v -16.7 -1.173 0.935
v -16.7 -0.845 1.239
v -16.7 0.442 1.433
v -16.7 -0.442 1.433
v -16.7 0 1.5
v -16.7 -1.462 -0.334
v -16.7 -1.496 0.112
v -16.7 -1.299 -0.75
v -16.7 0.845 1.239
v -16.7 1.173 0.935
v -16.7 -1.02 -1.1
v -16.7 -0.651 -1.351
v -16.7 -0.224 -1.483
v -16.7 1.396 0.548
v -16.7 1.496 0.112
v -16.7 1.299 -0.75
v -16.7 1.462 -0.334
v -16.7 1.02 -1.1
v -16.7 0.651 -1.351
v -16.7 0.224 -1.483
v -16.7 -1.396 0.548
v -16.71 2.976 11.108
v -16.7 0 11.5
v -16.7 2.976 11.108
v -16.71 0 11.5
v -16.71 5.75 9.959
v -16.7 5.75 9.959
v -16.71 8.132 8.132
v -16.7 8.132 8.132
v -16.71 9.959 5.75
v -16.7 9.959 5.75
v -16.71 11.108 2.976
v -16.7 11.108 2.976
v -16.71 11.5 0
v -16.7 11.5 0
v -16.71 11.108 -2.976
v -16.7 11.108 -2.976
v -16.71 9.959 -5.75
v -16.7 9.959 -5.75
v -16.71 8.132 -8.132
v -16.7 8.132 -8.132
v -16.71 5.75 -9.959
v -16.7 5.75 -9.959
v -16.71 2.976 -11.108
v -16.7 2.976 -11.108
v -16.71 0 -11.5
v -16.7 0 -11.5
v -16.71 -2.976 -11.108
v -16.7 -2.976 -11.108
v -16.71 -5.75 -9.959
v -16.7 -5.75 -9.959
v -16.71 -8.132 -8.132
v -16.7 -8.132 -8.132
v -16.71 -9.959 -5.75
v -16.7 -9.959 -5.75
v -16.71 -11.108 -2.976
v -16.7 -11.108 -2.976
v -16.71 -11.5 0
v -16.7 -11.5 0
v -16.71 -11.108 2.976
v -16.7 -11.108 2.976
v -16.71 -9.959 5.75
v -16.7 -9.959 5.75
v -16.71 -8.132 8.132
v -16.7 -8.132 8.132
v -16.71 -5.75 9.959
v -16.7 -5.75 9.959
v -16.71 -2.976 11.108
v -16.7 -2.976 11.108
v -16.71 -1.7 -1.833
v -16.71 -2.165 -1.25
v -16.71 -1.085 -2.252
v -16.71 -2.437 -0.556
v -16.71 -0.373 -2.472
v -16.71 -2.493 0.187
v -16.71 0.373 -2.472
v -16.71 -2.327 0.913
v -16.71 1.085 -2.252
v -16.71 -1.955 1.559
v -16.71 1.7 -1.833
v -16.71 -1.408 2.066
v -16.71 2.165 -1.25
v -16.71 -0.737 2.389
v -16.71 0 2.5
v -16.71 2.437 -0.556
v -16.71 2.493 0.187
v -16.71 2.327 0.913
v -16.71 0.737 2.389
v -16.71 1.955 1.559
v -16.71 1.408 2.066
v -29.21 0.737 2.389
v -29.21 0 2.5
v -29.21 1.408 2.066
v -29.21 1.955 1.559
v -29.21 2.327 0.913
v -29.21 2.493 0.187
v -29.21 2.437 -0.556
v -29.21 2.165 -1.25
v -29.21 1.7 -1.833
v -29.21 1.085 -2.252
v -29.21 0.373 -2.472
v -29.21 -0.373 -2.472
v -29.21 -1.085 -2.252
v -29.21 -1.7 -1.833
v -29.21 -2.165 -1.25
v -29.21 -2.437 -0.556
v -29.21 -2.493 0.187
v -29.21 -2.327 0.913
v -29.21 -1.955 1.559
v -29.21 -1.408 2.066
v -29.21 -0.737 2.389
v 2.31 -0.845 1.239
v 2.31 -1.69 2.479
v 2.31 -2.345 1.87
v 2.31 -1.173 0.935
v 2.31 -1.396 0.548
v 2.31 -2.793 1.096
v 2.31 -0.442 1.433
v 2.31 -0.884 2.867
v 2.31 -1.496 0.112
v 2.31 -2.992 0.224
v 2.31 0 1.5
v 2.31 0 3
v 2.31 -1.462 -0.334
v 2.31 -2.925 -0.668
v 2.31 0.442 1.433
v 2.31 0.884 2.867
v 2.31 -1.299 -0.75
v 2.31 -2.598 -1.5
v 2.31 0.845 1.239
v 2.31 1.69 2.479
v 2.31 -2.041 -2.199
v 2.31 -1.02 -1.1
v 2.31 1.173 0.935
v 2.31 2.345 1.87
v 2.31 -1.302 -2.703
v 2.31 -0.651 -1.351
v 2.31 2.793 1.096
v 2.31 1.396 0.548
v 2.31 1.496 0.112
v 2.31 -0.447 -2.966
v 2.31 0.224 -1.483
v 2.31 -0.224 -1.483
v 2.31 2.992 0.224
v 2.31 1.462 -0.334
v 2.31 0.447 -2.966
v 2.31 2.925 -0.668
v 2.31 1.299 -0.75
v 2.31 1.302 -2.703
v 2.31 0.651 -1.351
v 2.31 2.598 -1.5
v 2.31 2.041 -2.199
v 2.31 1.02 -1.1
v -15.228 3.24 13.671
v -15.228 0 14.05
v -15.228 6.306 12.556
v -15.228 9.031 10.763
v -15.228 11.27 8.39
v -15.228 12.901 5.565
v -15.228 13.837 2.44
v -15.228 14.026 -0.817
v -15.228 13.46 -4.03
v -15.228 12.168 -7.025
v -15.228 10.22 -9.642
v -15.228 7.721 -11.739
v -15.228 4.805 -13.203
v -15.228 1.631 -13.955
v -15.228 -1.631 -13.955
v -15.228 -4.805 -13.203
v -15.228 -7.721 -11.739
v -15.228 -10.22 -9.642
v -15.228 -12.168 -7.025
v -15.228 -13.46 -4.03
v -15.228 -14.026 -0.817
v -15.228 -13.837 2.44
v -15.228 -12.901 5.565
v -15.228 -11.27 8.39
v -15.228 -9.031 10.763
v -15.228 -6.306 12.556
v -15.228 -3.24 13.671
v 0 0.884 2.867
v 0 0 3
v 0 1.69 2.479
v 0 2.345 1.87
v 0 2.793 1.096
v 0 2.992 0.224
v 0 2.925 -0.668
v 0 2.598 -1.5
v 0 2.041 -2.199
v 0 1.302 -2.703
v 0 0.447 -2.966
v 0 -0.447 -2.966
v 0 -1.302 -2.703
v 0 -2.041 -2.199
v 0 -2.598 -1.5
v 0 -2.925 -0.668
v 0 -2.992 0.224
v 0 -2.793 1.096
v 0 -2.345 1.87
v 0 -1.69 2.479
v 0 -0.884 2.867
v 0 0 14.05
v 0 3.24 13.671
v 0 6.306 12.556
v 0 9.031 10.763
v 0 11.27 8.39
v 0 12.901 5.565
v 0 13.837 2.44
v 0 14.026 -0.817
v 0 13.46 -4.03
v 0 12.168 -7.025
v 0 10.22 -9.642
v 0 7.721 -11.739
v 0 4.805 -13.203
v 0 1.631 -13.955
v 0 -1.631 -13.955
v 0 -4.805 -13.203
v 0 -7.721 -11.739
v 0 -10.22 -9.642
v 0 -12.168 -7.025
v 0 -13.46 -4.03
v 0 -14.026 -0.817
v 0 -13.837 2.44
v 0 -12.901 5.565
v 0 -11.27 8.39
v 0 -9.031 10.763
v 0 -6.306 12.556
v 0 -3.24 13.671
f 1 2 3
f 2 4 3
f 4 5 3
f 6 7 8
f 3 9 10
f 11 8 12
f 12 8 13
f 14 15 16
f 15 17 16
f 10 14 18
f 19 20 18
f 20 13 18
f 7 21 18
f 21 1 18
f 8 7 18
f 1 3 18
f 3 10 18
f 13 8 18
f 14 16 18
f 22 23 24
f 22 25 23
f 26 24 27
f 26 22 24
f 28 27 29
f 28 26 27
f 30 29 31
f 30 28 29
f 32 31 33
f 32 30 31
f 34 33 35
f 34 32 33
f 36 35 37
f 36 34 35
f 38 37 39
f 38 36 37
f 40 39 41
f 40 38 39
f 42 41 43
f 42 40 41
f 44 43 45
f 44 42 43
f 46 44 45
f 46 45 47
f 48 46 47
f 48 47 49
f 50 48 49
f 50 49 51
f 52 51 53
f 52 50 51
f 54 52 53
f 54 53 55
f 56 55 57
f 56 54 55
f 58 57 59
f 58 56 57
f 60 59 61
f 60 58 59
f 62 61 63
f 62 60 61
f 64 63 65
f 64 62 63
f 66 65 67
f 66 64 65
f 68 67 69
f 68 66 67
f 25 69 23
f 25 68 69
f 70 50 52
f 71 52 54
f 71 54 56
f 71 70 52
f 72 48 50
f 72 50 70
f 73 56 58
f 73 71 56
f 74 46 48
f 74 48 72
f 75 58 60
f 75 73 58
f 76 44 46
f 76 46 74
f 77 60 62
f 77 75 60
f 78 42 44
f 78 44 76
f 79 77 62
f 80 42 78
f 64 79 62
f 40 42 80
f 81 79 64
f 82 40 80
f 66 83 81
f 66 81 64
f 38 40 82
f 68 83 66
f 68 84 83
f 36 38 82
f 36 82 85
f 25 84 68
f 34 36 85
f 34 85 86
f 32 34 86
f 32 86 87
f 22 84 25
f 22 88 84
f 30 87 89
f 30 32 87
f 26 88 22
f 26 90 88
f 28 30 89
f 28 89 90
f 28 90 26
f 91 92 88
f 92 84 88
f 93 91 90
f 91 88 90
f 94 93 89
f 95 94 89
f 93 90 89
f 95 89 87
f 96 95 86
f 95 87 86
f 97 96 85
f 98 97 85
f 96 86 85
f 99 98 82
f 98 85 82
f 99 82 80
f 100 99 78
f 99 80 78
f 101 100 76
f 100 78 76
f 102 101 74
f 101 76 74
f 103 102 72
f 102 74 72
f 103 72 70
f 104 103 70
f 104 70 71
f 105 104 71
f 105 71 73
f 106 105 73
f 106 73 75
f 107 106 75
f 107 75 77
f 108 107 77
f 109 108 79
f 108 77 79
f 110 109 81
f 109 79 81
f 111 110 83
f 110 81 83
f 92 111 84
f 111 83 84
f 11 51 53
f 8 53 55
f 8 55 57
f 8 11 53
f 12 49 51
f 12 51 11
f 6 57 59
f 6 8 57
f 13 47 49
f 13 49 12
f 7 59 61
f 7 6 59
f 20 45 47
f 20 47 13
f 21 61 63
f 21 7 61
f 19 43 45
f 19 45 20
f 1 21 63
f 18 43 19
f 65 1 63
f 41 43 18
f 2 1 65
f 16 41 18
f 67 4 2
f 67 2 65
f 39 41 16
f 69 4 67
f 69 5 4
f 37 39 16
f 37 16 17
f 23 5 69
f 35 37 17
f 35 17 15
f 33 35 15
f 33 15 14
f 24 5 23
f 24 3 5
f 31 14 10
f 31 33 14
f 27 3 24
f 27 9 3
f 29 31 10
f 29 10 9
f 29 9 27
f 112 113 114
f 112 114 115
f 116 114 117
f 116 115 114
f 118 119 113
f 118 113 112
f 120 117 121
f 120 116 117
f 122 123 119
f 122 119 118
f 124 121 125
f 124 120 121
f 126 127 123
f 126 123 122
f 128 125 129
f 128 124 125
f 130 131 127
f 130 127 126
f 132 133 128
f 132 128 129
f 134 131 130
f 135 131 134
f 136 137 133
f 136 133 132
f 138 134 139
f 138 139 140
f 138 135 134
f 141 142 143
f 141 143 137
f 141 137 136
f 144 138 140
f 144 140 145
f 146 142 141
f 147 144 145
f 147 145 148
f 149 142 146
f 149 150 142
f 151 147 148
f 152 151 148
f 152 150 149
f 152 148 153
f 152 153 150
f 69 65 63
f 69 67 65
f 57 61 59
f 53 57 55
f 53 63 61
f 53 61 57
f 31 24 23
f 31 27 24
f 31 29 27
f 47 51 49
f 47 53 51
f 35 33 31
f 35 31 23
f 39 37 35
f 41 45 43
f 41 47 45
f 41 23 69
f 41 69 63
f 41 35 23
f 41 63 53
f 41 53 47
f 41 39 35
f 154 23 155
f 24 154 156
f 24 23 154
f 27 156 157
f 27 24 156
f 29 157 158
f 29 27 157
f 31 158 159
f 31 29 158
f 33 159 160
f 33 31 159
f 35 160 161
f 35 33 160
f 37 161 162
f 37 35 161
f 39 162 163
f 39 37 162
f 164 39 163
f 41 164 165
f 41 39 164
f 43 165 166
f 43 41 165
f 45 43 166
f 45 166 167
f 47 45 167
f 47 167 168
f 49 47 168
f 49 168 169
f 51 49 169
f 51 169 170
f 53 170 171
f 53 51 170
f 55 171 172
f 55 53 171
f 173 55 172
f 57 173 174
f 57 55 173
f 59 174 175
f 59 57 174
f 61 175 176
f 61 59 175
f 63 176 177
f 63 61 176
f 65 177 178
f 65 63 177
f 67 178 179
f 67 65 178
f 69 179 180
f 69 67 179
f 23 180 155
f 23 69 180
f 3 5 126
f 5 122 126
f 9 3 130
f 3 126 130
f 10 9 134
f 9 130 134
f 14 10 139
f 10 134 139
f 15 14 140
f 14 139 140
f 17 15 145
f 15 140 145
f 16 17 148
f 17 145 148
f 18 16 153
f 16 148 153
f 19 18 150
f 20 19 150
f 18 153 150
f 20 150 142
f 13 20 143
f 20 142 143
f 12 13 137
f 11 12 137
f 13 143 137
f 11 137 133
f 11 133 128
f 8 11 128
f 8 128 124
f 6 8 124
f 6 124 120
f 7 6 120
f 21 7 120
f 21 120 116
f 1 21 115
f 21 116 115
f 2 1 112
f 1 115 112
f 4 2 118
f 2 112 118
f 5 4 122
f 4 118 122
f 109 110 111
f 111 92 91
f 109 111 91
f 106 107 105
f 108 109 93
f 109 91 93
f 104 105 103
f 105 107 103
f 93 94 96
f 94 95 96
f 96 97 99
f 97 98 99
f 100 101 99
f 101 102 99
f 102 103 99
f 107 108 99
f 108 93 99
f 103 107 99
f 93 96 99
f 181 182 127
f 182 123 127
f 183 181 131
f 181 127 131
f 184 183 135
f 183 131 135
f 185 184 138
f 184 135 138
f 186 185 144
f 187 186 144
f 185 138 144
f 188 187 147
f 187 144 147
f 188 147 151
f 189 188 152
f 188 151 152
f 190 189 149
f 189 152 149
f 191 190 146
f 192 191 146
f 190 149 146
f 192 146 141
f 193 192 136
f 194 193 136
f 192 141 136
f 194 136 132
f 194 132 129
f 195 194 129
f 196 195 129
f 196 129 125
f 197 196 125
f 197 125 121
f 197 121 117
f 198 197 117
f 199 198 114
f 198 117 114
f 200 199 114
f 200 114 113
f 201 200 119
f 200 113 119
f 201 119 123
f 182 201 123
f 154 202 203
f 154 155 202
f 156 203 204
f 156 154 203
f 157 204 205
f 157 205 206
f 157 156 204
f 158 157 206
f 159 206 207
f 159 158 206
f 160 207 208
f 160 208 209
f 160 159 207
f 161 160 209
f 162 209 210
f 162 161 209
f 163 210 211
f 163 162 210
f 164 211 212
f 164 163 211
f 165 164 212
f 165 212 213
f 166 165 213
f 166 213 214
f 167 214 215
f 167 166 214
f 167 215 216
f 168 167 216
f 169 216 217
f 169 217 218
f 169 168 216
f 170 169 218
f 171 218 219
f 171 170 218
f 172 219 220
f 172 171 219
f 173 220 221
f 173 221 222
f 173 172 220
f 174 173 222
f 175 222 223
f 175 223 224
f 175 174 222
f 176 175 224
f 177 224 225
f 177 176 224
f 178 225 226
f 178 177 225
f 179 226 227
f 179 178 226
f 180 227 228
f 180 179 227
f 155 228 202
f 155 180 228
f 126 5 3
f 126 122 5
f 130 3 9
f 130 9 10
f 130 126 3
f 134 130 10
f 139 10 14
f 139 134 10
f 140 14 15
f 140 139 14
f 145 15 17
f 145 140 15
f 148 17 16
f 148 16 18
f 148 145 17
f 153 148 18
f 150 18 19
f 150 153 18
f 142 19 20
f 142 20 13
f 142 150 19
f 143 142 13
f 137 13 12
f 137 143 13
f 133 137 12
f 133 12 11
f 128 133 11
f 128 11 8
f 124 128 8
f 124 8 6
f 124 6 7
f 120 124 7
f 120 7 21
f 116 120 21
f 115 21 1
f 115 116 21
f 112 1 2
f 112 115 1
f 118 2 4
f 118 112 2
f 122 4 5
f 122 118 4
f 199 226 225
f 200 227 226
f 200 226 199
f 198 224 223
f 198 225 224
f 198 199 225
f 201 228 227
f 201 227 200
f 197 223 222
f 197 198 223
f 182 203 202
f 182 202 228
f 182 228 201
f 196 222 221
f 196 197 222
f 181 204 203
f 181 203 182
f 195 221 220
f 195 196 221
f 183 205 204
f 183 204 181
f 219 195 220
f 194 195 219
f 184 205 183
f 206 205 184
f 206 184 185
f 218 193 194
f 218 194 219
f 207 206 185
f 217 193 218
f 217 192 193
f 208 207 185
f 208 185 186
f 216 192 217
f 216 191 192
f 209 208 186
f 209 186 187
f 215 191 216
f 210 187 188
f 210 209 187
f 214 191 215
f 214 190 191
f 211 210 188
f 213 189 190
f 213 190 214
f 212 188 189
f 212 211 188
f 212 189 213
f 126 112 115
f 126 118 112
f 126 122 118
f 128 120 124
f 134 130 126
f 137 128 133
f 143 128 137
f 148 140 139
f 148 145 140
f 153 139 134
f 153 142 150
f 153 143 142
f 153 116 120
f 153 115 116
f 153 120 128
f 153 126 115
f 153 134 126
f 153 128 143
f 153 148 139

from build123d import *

# Parameters (mm, degrees)
F1_W = 2.31
F1_H = 1.5
F2_W = 19.01
F2_H = 1.5
F3_W = 12.5
F3_H = 2.5


with BuildPart() as f4:
    # F1 (on Front) → F4 (revolve)
    with BuildSketch(Plane.XZ):
        with Locations((1.155, 2.25)):
            Rectangle(F1_W, F1_H)
        Polygon((0, 14.05), (-15.227757, 14.05), (-16.7, 11.5), (-16.7, 1.5), (0, 1.5), (0, 3), align=None)
    revolve(axis=Axis((-13.45, 0, 0), (-1, 0, 0)))


with BuildPart() as f5:
    # F2 (on Front) → F5 (revolve)
    with BuildSketch(Plane.XZ):
        with Locations((-7.195, 0.75)):
            Rectangle(F2_W, F2_H)
    revolve(axis=Axis((-13.45, 0, 0), (-1, 0, 0)))


with BuildPart() as f6:
    # F3 (on Front) → F6 (revolve)
    with BuildSketch(Plane.XZ):
        with Locations((-22.96, 1.25)):
            Rectangle(F3_W, F3_H)
        Polygon((-16.7, 11.5), (-16.71, 11.5), (-16.71, 2.5), (-16.71, 0), (-16.7, 0), align=None)
    revolve(axis=Axis((-13.45, 0, 0), (-1, 0, 0)))


solid = Compound([f4.part, f5.part, f6.part])
